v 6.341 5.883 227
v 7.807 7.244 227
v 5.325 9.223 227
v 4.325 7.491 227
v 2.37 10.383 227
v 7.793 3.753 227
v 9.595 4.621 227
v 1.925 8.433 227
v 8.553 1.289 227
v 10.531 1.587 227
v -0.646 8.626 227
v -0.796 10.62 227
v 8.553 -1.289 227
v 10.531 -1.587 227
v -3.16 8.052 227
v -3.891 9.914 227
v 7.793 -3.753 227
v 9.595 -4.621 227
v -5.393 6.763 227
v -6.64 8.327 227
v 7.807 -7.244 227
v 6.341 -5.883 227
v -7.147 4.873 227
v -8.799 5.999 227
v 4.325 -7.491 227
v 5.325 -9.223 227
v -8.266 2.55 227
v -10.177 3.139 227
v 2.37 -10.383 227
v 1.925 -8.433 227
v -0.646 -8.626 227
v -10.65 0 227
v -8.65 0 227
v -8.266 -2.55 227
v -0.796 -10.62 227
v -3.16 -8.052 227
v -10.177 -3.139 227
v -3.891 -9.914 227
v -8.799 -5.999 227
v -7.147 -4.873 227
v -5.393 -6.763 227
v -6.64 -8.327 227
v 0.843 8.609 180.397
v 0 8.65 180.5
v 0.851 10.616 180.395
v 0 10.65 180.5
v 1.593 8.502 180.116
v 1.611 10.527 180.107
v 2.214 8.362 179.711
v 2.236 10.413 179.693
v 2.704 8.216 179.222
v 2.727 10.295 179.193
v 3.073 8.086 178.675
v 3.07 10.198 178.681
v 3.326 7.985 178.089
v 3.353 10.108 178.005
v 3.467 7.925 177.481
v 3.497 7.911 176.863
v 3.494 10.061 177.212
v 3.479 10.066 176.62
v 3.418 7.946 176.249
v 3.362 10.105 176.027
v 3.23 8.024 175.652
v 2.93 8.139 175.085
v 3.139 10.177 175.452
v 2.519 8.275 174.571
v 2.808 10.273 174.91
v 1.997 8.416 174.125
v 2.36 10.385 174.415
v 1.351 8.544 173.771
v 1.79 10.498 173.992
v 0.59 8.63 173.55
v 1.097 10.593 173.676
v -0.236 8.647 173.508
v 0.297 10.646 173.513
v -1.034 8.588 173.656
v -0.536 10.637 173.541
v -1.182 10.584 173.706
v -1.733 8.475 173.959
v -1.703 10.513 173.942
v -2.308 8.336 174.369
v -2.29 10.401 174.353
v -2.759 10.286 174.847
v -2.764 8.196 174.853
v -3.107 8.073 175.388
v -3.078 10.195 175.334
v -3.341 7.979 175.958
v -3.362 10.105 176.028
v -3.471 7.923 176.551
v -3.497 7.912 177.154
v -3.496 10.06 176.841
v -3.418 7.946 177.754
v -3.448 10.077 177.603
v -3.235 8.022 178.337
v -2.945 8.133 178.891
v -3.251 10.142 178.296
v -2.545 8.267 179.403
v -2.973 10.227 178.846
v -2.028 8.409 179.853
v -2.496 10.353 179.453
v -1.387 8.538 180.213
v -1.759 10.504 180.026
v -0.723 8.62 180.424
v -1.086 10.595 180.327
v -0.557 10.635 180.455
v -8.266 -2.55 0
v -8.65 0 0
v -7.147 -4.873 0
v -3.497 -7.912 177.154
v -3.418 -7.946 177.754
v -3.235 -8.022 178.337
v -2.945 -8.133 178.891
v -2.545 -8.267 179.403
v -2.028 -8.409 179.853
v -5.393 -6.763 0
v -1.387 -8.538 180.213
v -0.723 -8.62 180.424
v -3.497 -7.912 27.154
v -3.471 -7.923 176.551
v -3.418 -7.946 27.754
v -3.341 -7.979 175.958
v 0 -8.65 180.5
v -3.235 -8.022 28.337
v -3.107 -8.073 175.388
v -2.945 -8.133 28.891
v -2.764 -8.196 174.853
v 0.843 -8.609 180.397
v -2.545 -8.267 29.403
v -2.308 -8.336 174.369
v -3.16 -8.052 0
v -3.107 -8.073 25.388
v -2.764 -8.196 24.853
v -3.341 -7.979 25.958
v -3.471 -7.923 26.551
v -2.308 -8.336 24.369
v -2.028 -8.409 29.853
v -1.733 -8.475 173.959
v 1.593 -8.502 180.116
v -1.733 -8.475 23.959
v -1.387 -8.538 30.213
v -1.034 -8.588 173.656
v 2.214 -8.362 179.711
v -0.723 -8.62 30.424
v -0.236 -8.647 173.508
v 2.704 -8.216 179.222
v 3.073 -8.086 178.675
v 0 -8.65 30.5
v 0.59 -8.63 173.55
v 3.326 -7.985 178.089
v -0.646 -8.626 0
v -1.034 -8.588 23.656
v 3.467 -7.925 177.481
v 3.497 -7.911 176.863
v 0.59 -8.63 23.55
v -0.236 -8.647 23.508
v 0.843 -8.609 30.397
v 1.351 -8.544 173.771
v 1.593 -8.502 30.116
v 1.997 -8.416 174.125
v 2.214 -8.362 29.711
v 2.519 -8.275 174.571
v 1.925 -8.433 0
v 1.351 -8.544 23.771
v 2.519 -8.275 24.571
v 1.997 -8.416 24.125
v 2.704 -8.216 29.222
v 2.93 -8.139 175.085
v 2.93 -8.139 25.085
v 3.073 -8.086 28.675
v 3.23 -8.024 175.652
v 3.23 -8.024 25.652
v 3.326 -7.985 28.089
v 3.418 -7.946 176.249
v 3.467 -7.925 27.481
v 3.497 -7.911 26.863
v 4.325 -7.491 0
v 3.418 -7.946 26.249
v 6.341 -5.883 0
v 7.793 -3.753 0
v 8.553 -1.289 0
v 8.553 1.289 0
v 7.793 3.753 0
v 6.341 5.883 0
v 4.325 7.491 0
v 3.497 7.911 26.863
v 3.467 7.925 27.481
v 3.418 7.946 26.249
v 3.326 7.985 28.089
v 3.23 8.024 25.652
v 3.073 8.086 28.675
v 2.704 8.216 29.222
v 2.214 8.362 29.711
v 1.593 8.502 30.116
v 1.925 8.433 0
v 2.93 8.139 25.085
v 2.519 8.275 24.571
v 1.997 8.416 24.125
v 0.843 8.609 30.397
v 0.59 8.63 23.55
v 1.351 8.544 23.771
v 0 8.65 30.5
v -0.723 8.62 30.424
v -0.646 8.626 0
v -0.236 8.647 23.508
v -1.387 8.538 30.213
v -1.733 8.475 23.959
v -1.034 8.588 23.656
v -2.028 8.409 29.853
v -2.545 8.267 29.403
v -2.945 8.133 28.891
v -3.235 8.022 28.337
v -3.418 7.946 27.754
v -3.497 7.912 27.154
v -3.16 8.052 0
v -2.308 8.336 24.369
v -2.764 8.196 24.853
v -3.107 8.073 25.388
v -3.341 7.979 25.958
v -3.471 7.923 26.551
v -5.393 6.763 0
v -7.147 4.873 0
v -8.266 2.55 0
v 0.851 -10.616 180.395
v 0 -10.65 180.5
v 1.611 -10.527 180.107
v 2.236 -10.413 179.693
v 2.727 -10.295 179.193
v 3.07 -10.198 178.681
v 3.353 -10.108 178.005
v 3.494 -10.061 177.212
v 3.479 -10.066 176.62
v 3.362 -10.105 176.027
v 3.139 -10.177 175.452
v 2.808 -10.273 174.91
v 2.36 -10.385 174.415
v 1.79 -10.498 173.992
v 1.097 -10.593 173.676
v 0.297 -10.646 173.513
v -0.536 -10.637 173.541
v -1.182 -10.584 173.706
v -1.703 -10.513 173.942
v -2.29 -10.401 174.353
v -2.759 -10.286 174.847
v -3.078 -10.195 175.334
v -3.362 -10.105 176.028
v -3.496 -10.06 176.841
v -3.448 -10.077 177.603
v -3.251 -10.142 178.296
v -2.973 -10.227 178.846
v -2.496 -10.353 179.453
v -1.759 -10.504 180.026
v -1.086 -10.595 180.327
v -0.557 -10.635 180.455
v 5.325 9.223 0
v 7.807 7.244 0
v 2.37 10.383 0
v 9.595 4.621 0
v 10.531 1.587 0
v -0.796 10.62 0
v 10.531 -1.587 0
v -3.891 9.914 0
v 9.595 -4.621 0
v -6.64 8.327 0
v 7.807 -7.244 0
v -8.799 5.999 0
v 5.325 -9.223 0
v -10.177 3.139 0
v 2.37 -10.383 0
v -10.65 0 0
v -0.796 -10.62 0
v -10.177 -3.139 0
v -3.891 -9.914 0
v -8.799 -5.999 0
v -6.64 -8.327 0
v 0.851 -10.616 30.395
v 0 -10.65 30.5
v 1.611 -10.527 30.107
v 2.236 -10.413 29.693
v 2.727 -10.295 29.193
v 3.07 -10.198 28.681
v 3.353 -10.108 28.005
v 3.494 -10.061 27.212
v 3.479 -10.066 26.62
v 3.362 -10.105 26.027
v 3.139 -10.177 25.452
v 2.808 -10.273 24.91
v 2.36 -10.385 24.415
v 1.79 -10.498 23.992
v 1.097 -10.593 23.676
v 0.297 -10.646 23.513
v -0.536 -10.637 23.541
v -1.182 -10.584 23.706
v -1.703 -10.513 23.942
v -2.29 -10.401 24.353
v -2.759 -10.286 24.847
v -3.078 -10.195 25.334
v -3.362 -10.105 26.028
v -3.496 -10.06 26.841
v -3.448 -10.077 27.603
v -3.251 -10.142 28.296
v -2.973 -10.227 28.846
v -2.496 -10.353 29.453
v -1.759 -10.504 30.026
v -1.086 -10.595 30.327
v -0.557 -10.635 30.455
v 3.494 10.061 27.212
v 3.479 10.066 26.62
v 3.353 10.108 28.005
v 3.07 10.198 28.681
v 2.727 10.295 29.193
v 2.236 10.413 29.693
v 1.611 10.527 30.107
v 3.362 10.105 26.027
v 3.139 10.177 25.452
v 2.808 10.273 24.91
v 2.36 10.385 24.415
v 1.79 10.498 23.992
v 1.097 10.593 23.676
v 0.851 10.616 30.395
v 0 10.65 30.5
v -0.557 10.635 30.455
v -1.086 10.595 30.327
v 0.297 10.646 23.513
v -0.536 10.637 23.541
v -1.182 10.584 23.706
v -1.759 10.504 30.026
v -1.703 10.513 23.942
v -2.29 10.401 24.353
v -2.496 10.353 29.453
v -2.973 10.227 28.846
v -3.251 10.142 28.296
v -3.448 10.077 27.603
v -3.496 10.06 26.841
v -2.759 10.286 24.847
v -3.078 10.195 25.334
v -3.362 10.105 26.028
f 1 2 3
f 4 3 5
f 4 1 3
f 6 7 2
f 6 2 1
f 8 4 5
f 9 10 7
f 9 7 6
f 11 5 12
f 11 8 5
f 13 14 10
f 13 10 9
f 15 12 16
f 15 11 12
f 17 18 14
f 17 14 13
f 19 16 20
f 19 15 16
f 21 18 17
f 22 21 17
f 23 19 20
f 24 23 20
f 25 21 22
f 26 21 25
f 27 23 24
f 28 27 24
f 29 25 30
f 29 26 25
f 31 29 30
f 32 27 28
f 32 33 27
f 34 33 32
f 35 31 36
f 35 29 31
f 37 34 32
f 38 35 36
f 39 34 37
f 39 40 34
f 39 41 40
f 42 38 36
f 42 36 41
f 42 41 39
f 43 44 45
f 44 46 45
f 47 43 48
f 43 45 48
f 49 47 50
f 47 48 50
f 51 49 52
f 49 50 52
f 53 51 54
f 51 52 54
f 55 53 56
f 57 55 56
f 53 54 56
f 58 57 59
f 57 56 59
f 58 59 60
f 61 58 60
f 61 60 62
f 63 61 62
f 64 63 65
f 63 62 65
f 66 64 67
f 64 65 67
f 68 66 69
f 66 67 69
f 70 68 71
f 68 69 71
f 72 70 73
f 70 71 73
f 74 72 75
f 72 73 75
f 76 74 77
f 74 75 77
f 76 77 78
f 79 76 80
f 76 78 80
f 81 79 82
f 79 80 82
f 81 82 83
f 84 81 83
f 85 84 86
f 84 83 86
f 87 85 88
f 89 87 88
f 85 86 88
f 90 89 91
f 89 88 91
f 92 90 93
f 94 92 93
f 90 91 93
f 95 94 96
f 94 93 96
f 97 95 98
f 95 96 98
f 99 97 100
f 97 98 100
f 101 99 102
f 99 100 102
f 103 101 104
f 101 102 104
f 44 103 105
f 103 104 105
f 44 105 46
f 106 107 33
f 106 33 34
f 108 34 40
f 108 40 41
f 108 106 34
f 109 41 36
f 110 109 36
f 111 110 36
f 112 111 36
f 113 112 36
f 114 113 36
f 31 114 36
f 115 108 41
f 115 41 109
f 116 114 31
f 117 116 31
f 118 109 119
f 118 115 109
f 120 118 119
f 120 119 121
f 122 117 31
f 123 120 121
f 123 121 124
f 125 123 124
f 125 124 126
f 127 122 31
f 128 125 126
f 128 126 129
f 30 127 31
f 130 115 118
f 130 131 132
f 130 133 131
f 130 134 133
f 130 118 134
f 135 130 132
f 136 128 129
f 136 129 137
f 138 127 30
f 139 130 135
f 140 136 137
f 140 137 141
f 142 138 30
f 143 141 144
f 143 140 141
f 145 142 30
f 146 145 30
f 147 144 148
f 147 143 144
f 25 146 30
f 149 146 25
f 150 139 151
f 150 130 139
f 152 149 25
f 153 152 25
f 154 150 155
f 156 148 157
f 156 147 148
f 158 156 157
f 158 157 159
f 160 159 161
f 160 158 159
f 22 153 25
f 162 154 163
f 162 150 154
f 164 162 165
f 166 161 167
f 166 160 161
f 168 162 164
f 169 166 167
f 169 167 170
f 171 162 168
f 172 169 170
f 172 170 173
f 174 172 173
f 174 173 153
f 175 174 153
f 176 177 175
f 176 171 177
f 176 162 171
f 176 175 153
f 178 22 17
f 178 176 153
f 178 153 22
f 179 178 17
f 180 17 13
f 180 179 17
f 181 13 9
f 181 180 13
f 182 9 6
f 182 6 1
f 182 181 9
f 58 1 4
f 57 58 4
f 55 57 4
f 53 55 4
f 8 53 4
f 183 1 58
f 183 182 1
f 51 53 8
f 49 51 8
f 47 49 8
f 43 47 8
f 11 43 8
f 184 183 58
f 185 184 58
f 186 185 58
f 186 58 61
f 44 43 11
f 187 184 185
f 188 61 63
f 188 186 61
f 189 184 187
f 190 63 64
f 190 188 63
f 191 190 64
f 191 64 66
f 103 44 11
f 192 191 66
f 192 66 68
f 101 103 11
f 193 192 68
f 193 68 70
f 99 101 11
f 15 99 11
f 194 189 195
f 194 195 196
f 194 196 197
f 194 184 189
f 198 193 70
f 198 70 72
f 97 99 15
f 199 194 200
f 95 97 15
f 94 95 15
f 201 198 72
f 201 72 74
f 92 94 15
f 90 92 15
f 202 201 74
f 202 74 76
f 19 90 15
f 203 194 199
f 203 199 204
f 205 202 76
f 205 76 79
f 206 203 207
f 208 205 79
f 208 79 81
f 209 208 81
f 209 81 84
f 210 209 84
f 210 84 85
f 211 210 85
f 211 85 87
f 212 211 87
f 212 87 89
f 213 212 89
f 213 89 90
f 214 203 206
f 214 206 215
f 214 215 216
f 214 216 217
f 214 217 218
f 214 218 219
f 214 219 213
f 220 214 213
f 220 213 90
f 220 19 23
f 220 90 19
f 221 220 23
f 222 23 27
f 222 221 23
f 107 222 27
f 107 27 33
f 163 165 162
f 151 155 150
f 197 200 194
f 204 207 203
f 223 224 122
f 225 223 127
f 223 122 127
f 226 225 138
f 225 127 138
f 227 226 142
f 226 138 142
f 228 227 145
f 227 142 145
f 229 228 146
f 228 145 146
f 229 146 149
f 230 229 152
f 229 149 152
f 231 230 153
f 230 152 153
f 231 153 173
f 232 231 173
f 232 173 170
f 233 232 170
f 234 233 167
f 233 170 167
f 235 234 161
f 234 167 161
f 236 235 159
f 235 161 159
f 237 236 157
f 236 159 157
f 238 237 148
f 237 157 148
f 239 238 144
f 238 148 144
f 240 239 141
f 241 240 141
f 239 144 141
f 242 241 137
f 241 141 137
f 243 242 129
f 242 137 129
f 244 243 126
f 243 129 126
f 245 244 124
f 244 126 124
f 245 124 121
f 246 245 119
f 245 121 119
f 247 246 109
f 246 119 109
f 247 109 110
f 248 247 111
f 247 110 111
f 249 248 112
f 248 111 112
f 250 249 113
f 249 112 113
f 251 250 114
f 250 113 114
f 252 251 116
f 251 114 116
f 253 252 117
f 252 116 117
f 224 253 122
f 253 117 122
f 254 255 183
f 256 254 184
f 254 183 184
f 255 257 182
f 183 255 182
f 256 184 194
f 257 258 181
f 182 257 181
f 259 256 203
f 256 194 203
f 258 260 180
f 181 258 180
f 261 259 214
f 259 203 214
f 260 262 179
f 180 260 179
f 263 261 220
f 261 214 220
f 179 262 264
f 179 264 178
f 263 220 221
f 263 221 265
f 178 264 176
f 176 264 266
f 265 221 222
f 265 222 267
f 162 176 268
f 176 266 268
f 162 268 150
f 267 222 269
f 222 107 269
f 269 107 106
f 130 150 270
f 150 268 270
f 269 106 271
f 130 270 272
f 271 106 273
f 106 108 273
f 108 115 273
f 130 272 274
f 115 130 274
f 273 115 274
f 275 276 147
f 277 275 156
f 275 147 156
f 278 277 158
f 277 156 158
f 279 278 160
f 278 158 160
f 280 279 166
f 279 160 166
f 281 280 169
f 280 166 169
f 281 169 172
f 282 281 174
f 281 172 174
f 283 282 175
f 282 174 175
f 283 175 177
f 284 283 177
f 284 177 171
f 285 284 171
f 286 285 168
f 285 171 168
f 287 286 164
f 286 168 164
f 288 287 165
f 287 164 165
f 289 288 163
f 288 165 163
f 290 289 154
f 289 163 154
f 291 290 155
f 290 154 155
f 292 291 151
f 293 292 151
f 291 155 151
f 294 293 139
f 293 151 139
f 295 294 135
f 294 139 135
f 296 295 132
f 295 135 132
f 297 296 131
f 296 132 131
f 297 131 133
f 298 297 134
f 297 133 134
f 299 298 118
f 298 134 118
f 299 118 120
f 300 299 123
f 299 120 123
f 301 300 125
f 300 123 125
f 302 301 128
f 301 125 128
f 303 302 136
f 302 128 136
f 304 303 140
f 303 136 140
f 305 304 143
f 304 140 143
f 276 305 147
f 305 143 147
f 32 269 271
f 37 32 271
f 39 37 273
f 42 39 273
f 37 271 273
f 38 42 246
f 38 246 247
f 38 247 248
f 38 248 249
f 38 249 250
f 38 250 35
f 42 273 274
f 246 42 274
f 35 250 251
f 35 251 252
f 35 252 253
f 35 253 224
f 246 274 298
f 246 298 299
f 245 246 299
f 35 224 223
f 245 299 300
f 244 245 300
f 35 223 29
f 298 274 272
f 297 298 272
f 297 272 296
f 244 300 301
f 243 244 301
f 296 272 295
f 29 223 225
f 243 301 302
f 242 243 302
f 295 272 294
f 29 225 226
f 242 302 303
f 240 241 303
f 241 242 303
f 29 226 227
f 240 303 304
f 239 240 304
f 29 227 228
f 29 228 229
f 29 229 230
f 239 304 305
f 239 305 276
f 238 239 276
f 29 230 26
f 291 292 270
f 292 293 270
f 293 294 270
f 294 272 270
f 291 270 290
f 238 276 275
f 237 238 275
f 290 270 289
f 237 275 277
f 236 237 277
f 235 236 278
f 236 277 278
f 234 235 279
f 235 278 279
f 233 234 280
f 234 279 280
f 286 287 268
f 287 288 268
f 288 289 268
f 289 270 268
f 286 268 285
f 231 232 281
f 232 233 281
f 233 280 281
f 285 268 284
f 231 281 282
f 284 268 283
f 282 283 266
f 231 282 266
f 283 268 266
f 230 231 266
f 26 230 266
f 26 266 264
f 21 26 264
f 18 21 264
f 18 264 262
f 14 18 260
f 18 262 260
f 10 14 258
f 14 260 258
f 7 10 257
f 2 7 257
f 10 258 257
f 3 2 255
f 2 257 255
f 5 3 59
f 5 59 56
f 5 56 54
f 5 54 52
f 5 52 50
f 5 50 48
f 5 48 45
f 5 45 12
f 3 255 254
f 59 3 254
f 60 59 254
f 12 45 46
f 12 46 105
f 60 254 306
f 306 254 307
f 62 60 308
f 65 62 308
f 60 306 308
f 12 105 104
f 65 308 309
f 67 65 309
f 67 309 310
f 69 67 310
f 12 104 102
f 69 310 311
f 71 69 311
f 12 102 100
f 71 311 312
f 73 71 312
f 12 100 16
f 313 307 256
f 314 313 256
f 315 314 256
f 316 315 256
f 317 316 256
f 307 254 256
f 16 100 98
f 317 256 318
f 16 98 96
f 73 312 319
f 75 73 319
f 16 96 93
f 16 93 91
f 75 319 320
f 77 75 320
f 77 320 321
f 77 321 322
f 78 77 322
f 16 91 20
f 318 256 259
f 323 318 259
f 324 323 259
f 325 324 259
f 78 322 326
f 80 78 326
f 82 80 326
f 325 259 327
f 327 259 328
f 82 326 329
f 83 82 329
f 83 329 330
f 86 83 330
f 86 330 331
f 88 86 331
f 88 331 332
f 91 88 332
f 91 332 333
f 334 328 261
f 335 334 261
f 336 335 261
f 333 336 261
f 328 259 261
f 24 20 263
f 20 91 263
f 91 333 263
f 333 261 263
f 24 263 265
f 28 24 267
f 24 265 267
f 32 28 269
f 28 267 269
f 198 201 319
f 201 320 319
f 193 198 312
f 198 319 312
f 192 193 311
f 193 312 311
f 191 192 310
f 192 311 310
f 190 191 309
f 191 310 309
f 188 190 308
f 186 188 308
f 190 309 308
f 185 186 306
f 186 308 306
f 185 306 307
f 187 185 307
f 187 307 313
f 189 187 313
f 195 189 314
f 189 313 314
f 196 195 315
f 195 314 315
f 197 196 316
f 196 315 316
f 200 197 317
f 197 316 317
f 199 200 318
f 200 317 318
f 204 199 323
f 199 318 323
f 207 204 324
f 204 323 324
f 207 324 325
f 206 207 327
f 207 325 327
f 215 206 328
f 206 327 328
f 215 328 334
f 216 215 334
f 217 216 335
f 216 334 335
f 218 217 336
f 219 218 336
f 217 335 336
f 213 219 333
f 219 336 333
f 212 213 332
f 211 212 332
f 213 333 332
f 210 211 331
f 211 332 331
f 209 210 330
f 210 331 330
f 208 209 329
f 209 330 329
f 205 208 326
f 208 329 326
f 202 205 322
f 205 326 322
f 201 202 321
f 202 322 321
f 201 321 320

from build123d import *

# Parameters (mm, degrees)
SKETCH1_R           = 10.65
SKETCH1_R_2         = 8.65
BOSS_EXTRUDE1_DEPTH = 227
SKETCH2_R           = 3.5
CUT_EXTRUDE1_DEPTH  = 228.499109888
LPATTERN1_COUNT     = 2
LPATTERN1_PITCH     = 150


with BuildPart() as part:
    # Sketch1 → Boss-Extrude1 (new body)
    with BuildSketch(Plane.XY):
        with Locations(Location((0, 0, 0), (0, 0, 180))):
            Circle(SKETCH1_R)
        with Locations(Location((0, 0, 0), (0, 0, 180))):
            Circle(SKETCH1_R_2, mode=Mode.SUBTRACT)
    extrude(amount=BOSS_EXTRUDE1_DEPTH)

    # Sketch2 → Cut-Extrude1 (cut, symmetric)
    with BuildSketch(Plane(origin=(0, 0, 0), x_dir=(1, 0, 0), z_dir=(0, 1, 0))):
        with Locations(Location((0, -177, 0), (0, 0, 270))):
            Circle(SKETCH2_R)
    cut_extrude1 = extrude(amount=CUT_EXTRUDE1_DEPTH, both=True, mode=Mode.SUBTRACT)

    # LPattern1: Cut-Extrude1 ×2
    with Locations(*[(0, 0, -i * LPATTERN1_PITCH) for i in range(1, LPATTERN1_COUNT)]):
        add(cut_extrude1, mode=Mode.SUBTRACT)


solid = part.part
